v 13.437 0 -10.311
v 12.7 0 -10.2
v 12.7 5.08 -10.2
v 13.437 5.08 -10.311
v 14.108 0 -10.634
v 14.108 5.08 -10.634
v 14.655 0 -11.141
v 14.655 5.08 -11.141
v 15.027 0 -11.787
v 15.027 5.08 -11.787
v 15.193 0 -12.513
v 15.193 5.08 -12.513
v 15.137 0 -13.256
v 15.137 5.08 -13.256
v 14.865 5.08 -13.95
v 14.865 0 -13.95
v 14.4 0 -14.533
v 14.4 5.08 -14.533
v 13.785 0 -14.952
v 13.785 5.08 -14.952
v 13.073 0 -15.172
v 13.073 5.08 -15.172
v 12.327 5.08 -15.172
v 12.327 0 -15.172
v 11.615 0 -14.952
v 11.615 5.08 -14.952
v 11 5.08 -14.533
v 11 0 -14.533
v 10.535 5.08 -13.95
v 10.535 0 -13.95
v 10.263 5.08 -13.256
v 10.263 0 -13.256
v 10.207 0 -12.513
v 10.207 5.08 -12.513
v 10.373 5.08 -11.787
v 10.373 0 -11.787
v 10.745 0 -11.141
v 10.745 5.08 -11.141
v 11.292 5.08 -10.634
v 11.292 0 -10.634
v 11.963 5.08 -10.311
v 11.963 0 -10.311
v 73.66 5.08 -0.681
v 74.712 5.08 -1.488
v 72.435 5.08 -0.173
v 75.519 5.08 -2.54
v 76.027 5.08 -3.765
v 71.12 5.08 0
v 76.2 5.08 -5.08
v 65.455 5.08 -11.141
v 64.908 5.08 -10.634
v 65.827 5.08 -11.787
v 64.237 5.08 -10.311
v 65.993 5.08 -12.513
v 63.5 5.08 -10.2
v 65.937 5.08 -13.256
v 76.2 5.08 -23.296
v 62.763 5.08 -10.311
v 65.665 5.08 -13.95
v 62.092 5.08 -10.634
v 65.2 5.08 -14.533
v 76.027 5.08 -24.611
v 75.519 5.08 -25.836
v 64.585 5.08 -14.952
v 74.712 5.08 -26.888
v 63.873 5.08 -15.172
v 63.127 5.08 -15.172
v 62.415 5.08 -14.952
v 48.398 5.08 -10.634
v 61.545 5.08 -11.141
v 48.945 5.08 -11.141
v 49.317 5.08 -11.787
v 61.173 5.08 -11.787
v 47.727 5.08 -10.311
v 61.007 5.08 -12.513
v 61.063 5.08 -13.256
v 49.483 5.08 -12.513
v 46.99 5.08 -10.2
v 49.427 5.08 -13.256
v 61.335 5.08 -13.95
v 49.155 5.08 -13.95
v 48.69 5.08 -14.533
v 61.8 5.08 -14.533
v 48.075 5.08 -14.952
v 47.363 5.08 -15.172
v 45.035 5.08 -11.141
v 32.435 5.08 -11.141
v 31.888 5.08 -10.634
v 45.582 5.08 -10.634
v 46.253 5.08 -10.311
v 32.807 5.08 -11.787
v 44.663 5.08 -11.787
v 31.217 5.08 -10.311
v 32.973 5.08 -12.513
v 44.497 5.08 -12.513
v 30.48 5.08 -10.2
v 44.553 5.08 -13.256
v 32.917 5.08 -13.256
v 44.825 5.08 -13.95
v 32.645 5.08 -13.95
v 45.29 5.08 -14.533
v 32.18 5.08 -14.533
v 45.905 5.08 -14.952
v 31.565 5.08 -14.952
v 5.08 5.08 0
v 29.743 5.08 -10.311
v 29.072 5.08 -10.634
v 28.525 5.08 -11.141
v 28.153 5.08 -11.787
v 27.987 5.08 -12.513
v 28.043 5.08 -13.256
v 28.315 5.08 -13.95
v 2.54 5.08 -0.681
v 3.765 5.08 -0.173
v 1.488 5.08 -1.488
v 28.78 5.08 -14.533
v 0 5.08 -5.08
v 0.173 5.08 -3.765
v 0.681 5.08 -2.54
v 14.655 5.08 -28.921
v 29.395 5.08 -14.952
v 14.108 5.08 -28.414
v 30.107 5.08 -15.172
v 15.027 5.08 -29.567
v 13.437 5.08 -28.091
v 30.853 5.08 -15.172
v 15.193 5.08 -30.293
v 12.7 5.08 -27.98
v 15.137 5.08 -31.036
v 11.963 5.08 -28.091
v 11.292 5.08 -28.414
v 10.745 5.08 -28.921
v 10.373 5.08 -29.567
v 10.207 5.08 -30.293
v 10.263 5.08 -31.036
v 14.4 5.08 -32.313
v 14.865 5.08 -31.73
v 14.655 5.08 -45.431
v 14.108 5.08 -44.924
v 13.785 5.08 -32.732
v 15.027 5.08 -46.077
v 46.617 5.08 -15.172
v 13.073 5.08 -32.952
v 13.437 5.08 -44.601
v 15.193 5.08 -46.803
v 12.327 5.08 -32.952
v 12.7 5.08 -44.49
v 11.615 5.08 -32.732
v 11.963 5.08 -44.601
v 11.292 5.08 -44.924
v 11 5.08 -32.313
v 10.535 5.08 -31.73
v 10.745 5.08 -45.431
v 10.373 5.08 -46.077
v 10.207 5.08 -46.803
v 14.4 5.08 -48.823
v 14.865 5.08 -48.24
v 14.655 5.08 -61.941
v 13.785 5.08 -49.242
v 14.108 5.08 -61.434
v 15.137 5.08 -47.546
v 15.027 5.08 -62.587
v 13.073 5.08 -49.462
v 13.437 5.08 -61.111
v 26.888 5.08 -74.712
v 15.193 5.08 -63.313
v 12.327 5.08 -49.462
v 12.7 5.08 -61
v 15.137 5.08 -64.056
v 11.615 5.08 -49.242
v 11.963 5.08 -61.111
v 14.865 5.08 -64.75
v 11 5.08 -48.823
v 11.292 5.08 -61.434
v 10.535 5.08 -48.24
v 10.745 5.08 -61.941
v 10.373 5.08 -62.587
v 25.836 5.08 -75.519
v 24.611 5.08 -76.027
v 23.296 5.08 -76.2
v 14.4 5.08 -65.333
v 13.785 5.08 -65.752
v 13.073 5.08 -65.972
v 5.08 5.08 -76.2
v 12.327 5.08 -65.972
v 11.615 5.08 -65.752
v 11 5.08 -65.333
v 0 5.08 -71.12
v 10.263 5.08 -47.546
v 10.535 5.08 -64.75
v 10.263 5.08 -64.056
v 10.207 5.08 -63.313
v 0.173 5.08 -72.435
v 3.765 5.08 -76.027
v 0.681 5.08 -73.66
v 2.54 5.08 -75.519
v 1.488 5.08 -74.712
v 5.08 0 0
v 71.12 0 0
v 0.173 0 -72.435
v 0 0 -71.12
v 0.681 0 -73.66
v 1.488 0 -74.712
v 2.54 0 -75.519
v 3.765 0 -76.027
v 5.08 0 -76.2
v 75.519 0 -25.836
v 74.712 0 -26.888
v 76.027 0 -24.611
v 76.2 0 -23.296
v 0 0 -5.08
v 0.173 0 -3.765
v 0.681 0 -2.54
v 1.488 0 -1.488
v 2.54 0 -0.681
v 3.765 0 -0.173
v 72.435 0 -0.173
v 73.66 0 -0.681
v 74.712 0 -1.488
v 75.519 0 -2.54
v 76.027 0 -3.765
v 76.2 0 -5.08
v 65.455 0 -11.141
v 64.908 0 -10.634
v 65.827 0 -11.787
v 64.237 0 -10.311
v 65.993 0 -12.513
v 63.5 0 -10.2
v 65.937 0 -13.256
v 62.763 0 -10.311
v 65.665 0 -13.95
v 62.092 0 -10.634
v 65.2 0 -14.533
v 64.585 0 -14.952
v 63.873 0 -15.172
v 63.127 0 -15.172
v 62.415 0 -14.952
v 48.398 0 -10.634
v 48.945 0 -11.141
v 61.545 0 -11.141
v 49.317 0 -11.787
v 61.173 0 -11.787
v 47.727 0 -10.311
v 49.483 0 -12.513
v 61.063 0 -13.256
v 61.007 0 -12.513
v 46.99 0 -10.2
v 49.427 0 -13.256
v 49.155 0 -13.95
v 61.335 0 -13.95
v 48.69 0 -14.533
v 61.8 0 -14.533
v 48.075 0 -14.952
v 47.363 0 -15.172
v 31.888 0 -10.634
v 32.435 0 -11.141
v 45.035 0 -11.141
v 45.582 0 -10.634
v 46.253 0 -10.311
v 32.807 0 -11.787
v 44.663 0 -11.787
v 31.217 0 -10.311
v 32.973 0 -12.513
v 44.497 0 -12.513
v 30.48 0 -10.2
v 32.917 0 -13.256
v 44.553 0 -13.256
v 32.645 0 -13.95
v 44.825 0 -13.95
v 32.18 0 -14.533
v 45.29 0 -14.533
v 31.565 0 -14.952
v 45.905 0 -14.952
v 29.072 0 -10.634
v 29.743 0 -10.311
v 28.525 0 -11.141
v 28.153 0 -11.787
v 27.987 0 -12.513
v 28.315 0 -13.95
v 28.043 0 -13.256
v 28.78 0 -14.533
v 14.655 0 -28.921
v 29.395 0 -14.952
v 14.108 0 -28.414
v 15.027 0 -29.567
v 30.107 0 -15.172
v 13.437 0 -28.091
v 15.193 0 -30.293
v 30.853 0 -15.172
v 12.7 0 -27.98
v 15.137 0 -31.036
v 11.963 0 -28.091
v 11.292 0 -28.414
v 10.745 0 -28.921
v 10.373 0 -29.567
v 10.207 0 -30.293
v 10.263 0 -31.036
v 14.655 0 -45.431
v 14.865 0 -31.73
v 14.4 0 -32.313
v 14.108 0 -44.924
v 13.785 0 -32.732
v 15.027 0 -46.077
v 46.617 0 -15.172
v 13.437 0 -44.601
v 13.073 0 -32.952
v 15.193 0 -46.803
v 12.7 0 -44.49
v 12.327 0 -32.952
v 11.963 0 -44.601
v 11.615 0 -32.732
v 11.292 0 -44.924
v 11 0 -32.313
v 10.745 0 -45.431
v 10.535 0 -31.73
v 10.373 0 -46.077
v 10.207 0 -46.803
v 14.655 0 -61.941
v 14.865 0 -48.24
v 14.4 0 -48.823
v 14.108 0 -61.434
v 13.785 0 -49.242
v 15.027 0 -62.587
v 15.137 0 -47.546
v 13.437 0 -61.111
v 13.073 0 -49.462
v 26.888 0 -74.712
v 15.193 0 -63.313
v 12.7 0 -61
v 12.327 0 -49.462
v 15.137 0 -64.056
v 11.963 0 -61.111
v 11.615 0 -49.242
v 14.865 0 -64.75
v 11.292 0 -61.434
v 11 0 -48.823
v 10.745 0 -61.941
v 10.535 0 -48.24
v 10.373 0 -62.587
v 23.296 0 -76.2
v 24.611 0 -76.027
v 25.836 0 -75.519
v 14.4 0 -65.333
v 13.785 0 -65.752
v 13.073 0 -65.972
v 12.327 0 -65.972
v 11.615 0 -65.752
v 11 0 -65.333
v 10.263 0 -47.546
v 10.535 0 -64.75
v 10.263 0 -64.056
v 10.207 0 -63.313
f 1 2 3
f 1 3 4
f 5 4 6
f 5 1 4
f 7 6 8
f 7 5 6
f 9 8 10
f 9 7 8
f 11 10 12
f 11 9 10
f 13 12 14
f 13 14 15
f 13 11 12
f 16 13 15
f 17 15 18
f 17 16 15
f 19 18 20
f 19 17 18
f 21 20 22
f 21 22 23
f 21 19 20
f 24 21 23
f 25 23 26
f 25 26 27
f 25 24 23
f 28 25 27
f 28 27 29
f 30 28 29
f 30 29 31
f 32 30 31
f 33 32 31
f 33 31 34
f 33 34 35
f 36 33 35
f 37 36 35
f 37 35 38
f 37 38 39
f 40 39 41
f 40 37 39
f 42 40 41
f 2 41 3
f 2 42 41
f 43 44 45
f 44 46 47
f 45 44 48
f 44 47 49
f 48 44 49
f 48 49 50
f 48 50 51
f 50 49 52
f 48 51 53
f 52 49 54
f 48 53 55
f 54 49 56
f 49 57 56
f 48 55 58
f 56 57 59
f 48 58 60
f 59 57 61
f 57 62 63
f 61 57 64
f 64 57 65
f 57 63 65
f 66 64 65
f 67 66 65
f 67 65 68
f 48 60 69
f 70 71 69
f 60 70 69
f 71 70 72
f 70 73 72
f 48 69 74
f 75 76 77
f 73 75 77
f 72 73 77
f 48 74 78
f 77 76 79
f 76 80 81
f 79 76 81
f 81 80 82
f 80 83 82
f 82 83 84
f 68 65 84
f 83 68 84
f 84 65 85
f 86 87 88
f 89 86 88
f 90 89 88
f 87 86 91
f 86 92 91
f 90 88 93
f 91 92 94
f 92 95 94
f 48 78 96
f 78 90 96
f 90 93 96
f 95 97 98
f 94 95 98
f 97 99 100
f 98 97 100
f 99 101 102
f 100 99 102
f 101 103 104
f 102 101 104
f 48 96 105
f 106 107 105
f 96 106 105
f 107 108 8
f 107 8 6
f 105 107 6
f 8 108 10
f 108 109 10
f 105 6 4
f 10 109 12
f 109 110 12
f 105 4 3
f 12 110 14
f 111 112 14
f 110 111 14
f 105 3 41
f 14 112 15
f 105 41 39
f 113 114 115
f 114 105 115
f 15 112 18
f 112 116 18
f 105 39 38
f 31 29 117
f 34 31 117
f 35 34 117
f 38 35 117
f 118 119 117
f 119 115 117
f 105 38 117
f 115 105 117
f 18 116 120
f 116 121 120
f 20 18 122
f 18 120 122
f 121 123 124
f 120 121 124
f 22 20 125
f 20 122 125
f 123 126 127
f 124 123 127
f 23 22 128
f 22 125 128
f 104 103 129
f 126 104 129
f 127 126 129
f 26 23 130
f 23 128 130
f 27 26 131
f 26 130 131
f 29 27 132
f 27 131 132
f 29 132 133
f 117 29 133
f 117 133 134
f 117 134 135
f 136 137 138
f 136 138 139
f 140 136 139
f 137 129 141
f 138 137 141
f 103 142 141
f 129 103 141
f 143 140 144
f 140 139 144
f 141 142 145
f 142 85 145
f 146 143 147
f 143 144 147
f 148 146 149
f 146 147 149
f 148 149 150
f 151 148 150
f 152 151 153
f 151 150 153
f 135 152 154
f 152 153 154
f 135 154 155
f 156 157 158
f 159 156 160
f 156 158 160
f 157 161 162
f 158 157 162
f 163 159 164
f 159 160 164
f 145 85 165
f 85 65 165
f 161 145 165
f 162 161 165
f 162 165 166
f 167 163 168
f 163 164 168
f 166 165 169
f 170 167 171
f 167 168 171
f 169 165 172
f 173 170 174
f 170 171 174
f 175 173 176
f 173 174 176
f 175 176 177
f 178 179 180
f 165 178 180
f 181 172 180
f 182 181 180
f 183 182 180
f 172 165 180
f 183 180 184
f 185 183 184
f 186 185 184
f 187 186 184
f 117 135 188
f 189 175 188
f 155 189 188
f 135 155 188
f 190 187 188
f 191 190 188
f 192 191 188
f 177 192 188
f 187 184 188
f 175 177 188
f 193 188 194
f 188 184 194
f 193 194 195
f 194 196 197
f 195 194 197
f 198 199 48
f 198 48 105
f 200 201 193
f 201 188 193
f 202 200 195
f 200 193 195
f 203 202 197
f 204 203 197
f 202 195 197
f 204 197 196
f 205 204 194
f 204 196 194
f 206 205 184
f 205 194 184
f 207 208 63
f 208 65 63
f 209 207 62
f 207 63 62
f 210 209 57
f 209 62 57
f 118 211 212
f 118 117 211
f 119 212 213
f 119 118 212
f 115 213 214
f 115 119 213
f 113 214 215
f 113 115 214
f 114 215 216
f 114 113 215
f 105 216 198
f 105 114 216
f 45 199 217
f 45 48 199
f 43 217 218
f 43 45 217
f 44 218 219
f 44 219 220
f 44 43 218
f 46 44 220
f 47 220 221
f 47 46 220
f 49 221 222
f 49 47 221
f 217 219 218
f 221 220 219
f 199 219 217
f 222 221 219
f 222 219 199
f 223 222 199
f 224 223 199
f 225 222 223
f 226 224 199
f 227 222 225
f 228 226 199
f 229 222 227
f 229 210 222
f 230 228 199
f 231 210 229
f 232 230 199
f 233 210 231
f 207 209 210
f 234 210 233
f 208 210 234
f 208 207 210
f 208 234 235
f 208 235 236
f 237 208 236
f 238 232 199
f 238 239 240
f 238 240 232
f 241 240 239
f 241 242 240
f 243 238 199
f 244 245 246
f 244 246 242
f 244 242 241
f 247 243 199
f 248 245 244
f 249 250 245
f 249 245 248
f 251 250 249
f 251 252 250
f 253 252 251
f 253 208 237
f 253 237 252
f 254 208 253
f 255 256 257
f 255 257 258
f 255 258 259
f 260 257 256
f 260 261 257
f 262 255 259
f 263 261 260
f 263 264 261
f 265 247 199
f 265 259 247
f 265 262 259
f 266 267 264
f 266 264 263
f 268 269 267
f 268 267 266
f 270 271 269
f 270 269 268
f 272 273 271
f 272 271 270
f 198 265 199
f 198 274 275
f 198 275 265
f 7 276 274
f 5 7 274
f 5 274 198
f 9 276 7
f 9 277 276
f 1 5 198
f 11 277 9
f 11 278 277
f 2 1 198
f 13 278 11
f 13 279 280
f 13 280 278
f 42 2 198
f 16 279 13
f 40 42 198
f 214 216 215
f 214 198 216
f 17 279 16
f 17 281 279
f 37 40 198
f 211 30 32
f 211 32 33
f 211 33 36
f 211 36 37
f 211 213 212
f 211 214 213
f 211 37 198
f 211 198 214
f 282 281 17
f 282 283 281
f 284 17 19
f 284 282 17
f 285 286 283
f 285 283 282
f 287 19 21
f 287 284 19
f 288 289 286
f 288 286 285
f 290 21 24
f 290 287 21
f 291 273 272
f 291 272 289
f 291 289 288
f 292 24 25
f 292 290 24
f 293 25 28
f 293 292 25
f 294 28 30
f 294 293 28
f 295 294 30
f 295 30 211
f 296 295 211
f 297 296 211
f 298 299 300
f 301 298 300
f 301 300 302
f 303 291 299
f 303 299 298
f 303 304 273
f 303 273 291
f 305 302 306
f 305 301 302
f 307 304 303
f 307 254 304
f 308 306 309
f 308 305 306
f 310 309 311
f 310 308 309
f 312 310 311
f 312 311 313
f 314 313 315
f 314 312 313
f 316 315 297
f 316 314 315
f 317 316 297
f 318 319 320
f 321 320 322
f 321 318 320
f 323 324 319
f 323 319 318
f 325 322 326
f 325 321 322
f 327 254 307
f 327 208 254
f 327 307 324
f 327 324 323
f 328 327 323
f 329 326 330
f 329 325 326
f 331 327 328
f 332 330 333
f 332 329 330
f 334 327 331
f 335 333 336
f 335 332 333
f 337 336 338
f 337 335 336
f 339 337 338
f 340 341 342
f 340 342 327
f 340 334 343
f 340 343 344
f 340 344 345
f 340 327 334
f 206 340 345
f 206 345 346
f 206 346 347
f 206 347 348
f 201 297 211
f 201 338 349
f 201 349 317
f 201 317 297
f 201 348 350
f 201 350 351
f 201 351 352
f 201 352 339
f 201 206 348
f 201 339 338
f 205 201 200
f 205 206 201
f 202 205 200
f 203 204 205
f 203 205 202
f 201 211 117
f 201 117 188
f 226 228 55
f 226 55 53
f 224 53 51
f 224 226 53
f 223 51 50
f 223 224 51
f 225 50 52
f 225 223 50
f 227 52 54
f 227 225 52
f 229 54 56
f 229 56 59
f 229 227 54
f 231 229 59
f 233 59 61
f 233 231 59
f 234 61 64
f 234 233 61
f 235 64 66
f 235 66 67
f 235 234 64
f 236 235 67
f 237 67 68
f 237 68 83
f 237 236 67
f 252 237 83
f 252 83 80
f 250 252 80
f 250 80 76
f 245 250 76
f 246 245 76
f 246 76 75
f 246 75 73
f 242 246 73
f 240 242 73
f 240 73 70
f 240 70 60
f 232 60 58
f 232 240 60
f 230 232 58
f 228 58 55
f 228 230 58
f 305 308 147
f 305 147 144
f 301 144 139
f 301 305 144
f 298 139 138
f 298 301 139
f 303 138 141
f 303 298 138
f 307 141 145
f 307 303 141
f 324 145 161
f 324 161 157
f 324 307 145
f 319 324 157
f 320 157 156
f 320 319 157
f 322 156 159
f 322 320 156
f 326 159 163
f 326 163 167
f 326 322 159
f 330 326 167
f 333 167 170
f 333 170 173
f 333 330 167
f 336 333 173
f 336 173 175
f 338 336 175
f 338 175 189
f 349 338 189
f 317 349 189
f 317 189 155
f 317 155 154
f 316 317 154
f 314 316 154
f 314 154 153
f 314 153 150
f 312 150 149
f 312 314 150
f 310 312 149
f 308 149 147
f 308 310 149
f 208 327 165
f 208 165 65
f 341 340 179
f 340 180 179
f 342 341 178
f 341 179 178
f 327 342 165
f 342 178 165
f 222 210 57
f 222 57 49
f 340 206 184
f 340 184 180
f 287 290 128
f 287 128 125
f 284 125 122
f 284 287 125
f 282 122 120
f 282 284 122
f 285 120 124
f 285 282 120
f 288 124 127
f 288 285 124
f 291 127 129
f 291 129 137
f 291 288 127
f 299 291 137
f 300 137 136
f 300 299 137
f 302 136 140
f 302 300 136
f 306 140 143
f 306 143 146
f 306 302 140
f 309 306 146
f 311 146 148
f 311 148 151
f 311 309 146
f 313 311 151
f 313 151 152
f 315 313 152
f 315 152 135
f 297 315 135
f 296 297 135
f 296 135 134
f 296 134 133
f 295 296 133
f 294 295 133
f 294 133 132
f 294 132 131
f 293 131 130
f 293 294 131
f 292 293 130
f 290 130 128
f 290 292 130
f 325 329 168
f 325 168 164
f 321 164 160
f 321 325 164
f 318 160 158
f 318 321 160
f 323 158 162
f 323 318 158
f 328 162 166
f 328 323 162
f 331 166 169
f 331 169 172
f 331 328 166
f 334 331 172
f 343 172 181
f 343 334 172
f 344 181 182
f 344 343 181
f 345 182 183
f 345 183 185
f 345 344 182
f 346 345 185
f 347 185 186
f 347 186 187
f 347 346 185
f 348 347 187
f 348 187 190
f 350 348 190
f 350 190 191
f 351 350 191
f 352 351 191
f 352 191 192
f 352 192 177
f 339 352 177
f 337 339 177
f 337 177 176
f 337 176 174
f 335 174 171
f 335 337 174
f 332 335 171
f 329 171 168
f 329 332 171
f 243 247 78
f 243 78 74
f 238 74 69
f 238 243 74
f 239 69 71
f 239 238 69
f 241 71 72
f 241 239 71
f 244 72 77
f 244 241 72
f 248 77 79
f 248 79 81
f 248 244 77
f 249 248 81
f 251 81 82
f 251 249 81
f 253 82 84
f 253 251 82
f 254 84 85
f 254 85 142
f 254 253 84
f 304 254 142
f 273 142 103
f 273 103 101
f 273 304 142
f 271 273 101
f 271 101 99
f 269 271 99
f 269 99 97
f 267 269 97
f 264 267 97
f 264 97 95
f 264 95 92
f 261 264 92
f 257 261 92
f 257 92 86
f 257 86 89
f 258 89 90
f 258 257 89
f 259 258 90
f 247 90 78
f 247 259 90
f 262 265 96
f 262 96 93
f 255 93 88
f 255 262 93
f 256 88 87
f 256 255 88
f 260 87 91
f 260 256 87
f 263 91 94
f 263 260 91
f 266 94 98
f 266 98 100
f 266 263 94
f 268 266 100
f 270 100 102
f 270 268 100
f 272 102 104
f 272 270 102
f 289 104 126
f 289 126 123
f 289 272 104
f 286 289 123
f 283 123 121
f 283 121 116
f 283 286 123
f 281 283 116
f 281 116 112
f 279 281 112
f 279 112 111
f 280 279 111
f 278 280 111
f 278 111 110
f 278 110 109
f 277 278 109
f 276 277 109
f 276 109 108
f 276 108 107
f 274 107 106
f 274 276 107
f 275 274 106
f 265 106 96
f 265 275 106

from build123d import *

# Parameters (mm, degrees)
SKETCH1_R           = 2.5
BOSS_EXTRUDE1_DEPTH = 5.08
FILLET1_R           = 5.08
FILLET2_R           = 5.08


with BuildPart() as part:
    # Sketch1 → Boss-Extrude1 (new body)
    with BuildSketch(Plane(origin=(0, 0, 0), x_dir=(1, 0, 0), z_dir=(0, 1, 0))):
        Polygon((0, 0), (0, 76.2), (25.4, 76.2), (76.2, 25.4), (76.2, 0), align=None)
        with Locations((12.7, 63.5)):
            Circle(SKETCH1_R, mode=Mode.SUBTRACT)
        with Locations((63.5, 12.7)):
            Circle(SKETCH1_R, mode=Mode.SUBTRACT)
        with Locations((12.7, 46.99)):
            Circle(SKETCH1_R, mode=Mode.SUBTRACT)
        with Locations((12.7, 30.48)):
            Circle(SKETCH1_R, mode=Mode.SUBTRACT)
        with Locations((46.99, 12.7)):
            Circle(SKETCH1_R, mode=Mode.SUBTRACT)
        with Locations((30.48, 12.7)):
            Circle(SKETCH1_R, mode=Mode.SUBTRACT)
        with Locations((12.7, 12.7)):
            Circle(SKETCH1_R, mode=Mode.SUBTRACT)
    extrude(amount=BOSS_EXTRUDE1_DEPTH)

    # Fillet1
    fillet1_edges = [part.edges().sort_by_distance(p)[0] for p in [
        (0, 2.54, 0),
    ]]
    fillet(fillet1_edges, radius=FILLET1_R)

    # Fillet2
    fillet2_edges = [part.edges().sort_by_distance(p)[0] for p in [
        (25.4, 2.54, -76.2),
        (0, 2.54, -76.2),
        (76.2, 2.54, 0),
        (76.2, 2.54, -25.4),
    ]]
    fillet(fillet2_edges, radius=FILLET2_R)


solid = part.part
